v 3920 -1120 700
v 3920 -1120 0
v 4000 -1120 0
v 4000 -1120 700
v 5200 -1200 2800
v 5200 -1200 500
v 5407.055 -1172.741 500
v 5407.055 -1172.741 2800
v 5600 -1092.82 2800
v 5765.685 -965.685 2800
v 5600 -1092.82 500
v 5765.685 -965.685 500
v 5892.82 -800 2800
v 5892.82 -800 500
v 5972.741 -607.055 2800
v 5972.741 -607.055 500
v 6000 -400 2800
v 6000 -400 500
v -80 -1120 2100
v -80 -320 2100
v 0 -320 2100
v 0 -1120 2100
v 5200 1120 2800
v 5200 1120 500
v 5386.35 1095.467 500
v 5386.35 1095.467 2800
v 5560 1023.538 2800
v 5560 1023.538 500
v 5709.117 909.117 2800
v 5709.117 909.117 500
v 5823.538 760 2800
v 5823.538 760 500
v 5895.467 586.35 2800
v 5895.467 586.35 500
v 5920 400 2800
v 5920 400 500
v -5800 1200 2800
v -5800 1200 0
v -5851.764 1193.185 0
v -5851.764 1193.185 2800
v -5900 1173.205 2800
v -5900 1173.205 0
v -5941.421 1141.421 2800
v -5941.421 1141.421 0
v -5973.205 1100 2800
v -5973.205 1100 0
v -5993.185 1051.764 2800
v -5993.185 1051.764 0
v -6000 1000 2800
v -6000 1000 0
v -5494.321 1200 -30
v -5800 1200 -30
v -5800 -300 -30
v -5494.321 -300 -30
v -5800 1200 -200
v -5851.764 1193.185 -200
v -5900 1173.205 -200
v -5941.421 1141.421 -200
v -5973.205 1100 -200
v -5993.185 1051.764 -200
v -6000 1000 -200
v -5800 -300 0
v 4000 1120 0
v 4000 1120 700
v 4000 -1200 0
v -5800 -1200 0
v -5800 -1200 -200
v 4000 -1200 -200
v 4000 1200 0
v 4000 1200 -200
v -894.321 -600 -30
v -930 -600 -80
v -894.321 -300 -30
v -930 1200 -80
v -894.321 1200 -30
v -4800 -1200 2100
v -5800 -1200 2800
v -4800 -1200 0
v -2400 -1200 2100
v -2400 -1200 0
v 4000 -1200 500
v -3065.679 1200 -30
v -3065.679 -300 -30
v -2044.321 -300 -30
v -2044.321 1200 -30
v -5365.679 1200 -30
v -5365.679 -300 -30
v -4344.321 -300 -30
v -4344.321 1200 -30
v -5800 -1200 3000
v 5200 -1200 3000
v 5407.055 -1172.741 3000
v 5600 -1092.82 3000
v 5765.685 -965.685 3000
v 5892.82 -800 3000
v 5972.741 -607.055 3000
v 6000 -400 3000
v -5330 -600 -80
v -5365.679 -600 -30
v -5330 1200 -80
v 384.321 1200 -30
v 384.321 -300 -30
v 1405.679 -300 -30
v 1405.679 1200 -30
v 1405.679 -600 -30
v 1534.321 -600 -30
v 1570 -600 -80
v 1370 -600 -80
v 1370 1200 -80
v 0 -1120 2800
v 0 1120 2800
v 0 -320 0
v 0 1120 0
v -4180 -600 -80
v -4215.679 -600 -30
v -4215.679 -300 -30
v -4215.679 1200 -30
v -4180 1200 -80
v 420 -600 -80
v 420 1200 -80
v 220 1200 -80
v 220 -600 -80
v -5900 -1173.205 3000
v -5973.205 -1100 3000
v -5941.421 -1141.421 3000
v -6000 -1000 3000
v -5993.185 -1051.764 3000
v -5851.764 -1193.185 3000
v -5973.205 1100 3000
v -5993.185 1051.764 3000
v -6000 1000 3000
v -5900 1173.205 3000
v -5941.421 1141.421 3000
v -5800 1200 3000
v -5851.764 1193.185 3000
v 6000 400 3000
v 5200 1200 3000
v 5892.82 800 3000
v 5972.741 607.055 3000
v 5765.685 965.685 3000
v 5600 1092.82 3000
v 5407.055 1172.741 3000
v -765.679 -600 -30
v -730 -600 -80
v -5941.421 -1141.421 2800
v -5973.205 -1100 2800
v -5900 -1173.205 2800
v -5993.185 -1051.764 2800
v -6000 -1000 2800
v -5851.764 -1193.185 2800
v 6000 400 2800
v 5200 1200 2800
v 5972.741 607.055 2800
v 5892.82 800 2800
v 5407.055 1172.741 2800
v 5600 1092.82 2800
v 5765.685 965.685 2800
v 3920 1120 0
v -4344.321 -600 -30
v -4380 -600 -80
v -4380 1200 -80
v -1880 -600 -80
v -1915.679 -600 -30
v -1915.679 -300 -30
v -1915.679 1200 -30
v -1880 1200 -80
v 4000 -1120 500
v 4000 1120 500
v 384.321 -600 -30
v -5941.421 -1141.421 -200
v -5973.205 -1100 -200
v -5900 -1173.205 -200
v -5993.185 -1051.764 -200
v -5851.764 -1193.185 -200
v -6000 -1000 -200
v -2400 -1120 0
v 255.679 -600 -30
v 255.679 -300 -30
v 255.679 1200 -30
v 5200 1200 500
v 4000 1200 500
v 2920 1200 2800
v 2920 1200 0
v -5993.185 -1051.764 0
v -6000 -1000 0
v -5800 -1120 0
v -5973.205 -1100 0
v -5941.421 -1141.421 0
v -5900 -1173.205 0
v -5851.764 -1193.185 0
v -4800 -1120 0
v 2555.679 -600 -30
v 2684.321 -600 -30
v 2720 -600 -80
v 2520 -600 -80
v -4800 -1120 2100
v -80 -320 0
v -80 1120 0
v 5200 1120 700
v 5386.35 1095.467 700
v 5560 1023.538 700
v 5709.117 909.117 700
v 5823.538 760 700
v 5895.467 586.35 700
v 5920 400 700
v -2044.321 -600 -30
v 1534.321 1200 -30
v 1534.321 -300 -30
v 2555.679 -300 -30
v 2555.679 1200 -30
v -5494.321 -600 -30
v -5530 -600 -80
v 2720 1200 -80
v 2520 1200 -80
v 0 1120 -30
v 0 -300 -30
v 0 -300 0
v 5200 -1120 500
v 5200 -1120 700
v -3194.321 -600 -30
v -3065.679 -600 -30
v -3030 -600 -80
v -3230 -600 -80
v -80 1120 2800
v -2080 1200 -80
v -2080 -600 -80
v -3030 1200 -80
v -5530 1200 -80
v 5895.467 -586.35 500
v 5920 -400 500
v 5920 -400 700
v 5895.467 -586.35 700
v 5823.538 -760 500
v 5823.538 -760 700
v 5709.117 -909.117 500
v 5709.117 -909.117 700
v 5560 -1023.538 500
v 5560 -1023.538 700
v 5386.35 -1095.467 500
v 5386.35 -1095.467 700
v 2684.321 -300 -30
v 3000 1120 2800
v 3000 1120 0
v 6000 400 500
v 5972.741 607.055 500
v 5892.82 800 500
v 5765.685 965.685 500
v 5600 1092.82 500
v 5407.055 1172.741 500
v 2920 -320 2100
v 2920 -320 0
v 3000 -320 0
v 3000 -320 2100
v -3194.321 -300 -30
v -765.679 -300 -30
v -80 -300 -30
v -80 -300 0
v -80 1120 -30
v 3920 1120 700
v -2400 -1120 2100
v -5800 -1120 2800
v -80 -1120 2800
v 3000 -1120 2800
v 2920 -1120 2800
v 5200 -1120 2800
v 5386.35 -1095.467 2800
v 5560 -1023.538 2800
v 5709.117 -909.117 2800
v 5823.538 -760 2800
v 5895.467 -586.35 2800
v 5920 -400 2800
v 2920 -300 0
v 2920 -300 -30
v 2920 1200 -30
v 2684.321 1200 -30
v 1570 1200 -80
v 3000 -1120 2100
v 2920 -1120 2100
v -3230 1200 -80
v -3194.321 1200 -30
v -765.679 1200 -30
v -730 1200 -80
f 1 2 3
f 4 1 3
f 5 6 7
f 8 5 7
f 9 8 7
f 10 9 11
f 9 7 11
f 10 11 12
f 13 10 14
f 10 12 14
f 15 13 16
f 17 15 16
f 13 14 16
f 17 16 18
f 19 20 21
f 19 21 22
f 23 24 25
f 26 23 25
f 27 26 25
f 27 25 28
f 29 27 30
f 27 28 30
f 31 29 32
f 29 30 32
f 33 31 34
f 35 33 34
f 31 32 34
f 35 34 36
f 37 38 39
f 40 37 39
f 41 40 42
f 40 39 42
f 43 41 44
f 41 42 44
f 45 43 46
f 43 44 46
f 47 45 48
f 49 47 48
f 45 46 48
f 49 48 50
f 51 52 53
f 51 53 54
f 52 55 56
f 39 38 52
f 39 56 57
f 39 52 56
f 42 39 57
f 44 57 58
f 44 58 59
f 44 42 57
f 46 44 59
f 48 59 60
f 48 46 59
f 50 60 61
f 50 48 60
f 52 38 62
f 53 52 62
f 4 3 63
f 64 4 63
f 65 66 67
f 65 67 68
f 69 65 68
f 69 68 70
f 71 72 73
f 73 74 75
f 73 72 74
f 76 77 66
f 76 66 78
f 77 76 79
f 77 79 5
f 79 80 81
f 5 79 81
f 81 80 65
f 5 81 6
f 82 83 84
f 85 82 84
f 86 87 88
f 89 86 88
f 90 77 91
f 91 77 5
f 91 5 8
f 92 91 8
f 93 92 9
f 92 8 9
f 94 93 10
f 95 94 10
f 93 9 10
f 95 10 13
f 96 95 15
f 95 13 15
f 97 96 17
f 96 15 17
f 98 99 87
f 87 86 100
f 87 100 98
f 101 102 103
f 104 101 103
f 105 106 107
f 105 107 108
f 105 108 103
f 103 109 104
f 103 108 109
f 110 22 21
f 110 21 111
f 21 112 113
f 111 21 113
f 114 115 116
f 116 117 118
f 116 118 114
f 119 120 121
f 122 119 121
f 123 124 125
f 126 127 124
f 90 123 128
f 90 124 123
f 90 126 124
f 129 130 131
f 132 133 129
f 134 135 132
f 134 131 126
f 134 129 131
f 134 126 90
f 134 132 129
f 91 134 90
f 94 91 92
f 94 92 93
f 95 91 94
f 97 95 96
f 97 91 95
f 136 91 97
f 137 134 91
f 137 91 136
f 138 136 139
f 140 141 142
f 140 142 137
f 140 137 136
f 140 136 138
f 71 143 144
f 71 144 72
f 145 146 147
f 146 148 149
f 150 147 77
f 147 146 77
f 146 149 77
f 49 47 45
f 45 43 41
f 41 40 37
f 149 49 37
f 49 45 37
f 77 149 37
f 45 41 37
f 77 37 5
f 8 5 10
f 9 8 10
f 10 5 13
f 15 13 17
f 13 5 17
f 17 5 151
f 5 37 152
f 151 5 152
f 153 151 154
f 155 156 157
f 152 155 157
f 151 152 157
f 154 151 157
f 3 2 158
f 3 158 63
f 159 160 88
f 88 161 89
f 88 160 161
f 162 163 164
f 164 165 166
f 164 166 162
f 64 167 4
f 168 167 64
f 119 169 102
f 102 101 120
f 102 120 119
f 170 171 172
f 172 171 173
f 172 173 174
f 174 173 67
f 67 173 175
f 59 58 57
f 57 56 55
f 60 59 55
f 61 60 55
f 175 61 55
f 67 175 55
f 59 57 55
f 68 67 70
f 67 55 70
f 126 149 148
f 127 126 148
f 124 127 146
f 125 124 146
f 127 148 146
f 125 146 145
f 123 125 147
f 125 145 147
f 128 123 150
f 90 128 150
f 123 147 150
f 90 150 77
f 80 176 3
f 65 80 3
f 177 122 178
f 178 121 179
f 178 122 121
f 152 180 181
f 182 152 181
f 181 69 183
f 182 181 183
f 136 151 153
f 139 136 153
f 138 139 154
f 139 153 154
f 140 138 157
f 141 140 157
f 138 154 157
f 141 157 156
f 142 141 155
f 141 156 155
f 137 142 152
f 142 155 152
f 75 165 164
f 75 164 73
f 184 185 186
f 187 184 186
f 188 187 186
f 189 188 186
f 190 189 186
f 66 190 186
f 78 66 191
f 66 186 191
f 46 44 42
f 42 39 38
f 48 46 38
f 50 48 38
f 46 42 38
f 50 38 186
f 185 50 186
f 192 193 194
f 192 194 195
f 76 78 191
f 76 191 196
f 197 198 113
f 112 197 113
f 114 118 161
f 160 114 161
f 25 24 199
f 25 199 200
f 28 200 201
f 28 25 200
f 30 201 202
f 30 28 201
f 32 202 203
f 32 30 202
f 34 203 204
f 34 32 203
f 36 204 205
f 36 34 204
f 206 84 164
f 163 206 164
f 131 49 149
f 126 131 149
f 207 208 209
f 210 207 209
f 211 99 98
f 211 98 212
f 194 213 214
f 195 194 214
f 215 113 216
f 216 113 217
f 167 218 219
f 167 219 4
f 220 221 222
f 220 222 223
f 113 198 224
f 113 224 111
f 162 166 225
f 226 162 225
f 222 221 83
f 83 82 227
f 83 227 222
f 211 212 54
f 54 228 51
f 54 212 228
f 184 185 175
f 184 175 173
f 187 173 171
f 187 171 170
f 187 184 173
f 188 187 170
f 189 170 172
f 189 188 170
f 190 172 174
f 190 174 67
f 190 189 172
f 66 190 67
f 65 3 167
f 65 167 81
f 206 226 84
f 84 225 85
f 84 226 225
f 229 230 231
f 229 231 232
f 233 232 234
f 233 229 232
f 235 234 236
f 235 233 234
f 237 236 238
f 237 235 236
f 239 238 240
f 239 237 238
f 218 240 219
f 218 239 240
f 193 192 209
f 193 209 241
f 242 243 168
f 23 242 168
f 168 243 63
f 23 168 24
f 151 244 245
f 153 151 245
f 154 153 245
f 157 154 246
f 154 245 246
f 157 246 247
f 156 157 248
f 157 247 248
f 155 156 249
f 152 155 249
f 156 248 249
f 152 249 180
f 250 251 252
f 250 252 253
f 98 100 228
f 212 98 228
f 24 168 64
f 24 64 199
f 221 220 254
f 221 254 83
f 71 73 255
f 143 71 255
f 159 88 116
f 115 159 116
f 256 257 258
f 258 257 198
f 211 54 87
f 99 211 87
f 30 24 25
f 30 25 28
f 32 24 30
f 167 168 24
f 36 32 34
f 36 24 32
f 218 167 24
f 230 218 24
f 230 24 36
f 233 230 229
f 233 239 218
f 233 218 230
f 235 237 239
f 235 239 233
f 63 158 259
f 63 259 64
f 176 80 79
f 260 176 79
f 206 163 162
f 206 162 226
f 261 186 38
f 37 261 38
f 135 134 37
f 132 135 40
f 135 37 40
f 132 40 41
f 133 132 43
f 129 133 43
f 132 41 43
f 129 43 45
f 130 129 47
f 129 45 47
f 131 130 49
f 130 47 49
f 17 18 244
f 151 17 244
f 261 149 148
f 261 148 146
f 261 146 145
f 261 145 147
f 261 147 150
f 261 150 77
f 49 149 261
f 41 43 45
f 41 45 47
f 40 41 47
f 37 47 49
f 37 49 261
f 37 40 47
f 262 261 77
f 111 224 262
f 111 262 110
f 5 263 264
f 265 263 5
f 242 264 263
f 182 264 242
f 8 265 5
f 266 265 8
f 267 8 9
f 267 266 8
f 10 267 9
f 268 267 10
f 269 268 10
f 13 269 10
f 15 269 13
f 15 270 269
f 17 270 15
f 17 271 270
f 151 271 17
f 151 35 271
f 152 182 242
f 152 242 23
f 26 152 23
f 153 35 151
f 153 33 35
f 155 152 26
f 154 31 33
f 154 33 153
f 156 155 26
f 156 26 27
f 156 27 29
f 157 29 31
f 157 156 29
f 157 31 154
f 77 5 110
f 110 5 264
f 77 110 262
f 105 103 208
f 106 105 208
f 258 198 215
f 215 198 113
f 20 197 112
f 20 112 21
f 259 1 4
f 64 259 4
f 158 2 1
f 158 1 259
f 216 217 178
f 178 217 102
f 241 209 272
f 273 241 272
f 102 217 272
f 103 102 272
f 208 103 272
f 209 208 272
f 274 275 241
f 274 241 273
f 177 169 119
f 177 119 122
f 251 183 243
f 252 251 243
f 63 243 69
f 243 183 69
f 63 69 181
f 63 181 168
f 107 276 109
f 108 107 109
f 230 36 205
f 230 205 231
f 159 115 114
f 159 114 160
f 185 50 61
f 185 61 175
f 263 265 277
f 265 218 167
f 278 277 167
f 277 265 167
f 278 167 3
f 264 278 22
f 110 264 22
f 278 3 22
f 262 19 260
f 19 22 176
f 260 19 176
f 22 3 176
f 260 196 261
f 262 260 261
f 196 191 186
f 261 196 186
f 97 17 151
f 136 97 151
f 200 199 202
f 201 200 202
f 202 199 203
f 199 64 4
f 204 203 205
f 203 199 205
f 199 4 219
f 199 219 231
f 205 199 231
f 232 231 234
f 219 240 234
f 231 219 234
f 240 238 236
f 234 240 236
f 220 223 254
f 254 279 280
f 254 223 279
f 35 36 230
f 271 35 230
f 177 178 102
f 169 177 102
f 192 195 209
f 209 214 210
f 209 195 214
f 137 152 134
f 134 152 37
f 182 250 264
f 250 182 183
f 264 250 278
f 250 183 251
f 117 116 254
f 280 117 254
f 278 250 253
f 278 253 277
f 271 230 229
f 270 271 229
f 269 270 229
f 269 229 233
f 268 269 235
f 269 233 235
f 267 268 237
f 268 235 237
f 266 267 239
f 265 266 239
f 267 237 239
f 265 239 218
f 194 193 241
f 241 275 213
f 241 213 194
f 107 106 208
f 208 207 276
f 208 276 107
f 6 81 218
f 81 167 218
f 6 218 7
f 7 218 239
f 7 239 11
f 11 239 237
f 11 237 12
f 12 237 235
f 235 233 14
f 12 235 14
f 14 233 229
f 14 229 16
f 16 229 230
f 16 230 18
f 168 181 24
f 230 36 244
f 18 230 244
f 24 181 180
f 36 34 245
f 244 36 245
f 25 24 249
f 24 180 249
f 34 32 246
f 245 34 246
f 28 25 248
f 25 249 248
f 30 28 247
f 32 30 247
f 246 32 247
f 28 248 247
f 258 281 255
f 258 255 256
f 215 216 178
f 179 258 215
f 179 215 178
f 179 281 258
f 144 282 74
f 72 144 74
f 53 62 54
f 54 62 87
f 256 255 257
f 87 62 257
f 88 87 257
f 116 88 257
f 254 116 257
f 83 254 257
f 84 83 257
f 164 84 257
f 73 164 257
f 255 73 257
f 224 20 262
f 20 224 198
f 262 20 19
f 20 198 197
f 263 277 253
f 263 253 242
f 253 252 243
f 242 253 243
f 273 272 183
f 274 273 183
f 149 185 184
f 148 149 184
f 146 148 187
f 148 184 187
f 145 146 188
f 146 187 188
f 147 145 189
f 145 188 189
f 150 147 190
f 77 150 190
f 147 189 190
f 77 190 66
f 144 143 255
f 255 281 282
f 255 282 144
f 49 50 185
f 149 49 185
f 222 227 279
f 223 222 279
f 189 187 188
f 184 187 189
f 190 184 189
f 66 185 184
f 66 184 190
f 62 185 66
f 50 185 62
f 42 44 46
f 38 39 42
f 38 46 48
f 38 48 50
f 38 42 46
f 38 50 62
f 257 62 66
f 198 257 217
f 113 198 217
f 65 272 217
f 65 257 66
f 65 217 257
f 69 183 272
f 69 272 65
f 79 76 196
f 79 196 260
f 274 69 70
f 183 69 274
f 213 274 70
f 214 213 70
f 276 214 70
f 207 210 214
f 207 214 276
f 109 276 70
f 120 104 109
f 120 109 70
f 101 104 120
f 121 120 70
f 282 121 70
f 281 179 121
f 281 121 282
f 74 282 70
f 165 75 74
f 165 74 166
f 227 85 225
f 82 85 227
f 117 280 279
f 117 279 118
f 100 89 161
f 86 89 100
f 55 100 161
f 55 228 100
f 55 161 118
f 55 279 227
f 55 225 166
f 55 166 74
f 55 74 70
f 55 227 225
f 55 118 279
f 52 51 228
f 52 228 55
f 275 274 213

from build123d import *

# Parameters (mm, degrees)
F0_W      = 80
F0_H      = 820
F0_H_2    = 1420
F1_DEPTH  = 2800
F0_W_2    = 920
F0_H_3    = 2240
F0_W_3    = 5720
F0_W_4    = 2920
F2_DEPTH  = 200
F3_W      = 2400
F3_H      = 2100
F4_DEPTH  = 1454.2702436447
F5_W      = 800
F5_H      = 2100
F6_DEPTH  = 3837.007522583
F7_DEPTH  = 30
F9_DEPTH  = 1800
F10_DEPTH = 500
F11_DEPTH = 700
F13_DEPTH = 200
F15_DEPTH = 200


with BuildPart() as f1:
    # F0 (on Top) → F1 (new body)
    with BuildSketch(Plane.XY):
        with BuildLine():
            Line((4000, -1200), (5200, -1200))
            ThreePointArc((5200, -1200), (5765.6854249492, -965.6854249492), (6000, -400))
            Line((6000, -400), (6000, 400))
            ThreePointArc((6000, 400), (5765.6854249492, 965.6854249492), (5200, 1200))
            Line((5200, 1200), (4000, 1200))
            Line((4000, 1200), (4000, 1120))
            Line((4000, 1120), (5200, 1120))
            ThreePointArc((5200, 1120), (5709.1168824543, 909.1168824543), (5920, 400))
            Line((5920, 400), (5920, -400))
            ThreePointArc((5920, -400), (5709.1168824543, -909.1168824543), (5200, -1120))
            Line((5200, -1120), (4000, -1120))
            Line((4000, -1120), (4000, -1200))
        make_face()
        with BuildLine():
            Line((-5800, -1200), (4000, -1200))
            Line((4000, -1200), (4000, -1120))
            Line((4000, -1120), (3920, -1120))
            Line((3920, -1120), (3000, -1120))
            Line((3000, -1120), (2920, -1120))
            Line((2920, -1120), (0, -1120))
            Line((0, -1120), (-80, -1120))
            Line((-80, -1120), (-5800, -1120))
            Line((-5800, -1120), (-5800, -300))
            Line((-5800, -300), (-5800, 1200))
            ThreePointArc((-5800, 1200), (-5941.4213562373, 1141.4213562373), (-6000, 1000))
            Line((-6000, 1000), (-6000, -1000))
            ThreePointArc((-6000, -1000), (-5941.4213562373, -1141.4213562373), (-5800, -1200))
        make_face()
        with Locations((-40, -710)):
            Rectangle(F0_W, F0_H)
        with Locations((-40, 410)):
            Rectangle(F0_W, F0_H_2)
        Polygon((3920, 1120), (4000, 1120), (4000, 1200), (2920, 1200), (2920, -300), (2920, -1120), (3000, -1120), (3000, 1120), align=None)
    extrude(amount=F1_DEPTH)

    # F3 (on face) → F4 (cut)
    with BuildSketch(Plane.XZ.offset(1200)):
        with Locations((-3600, 1050)):
            Rectangle(F3_W, F3_H)
    extrude(amount=-F4_DEPTH, mode=Mode.SUBTRACT)

    # F5 (on face) → F6 (cut)
    with BuildSketch(Plane(origin=(-80, 0, 0), x_dir=(0, -1, 0), z_dir=(-1, 0, 0))):
        with Locations((720, 1050)):
            Rectangle(F5_W, F5_H)
    extrude(amount=-F6_DEPTH, mode=Mode.SUBTRACT)

    # F0 (on Top) → F10 (cut)
    with BuildSketch(Plane.XY):
        with BuildLine():
            Line((4000, -1200), (5200, -1200))
            ThreePointArc((5200, -1200), (5765.6854249492, -965.6854249492), (6000, -400))
            Line((6000, -400), (6000, 400))
            ThreePointArc((6000, 400), (5765.6854249492, 965.6854249492), (5200, 1200))
            Line((5200, 1200), (4000, 1200))
            Line((4000, 1200), (4000, 1120))
            Line((4000, 1120), (5200, 1120))
            ThreePointArc((5200, 1120), (5709.1168824543, 909.1168824543), (5920, 400))
            Line((5920, 400), (5920, -400))
            ThreePointArc((5920, -400), (5709.1168824543, -909.1168824543), (5200, -1120))
            Line((5200, -1120), (4000, -1120))
            Line((4000, -1120), (4000, -1200))
        make_face()
    extrude(amount=F10_DEPTH, mode=Mode.SUBTRACT)


with BuildPart() as f2:
    # F0 (on Top) → F2 (new body)
    with BuildSketch(Plane.XY):
        with Locations((3460, 0)):
            Rectangle(F0_W_2, F0_H_3)
        with Locations((-40, -710)):
            Rectangle(F0_W, F0_H)
        with Locations((-40, 410)):
            Rectangle(F0_W, F0_H_2)
        with Locations((-2940, -710)):
            Rectangle(F0_W_3, F0_H)
        with Locations((1460, -710)):
            Rectangle(F0_W_4, F0_H)
        Polygon((2920, 1200), (-5800, 1200), (-5800, -300), (-80, -300), (-80, 1120), (0, 1120), (0, -300), (2920, -300), align=None)
        with BuildLine():
            Line((-5800, -1200), (4000, -1200))
            Line((4000, -1200), (4000, -1120))
            Line((4000, -1120), (3920, -1120))
            Line((3920, -1120), (3000, -1120))
            Line((3000, -1120), (2920, -1120))
            Line((2920, -1120), (0, -1120))
            Line((0, -1120), (-80, -1120))
            Line((-80, -1120), (-5800, -1120))
            Line((-5800, -1120), (-5800, -300))
            Line((-5800, -300), (-5800, 1200))
            ThreePointArc((-5800, 1200), (-5941.4213562373, 1141.4213562373), (-6000, 1000))
            Line((-6000, 1000), (-6000, -1000))
            ThreePointArc((-6000, -1000), (-5941.4213562373, -1141.4213562373), (-5800, -1200))
        make_face()
        Polygon((3920, 1120), (4000, 1120), (4000, 1200), (2920, 1200), (2920, -300), (2920, -1120), (3000, -1120), (3000, 1120), align=None)
        with Locations((3960, 0)):
            Rectangle(F0_W, F0_H_3)
    extrude(amount=-F2_DEPTH)

    # F0 (on Top) → F7 (cut)
    with BuildSketch(Plane.XY):
        Polygon((2920, 1200), (-5800, 1200), (-5800, -300), (-80, -300), (-80, 1120), (0, 1120), (0, -300), (2920, -300), align=None)
    extrude(amount=-F7_DEPTH, mode=Mode.SUBTRACT)

    # F8 (on face) → F9 (cut)
    with BuildSketch(Plane(origin=(0, 1200, 0), x_dir=(-1, 0, 0), z_dir=(0, 1, 0))):
        Polygon((-2555.679101944, -30), (-2684.320898056, -30), (-2720, -80), (-2520, -80), align=None)
        Polygon((-1405.679101944, -30), (-1534.320898056, -30), (-1570, -80), (-1370, -80), align=None)
        Polygon((-255.679101944, -30), (-384.320898056, -30), (-420, -80), (-220, -80), align=None)
        Polygon((2080, -80), (2044.320898056, -30), (1915.679101944, -30), (1880, -80), align=None)
        Polygon((894.320898056, -30), (765.679101944, -30), (730, -80), (930, -80), align=None)
        Polygon((3230, -80), (3194.320898056, -30), (3065.679101944, -30), (3030, -80), align=None)
        Polygon((4380, -80), (4344.320898056, -30), (4215.679101944, -30), (4180, -80), align=None)
        Polygon((5530, -80), (5494.320898056, -30), (5365.679101944, -30), (5330, -80), align=None)
    extrude(amount=-F9_DEPTH, mode=Mode.SUBTRACT)


with BuildPart() as f11:
    # F0 (on Top) → F11 (new body)
    with BuildSketch(Plane.XY):
        with Locations((3960, 0)):
            Rectangle(F0_W, F0_H_3)
    extrude(amount=F11_DEPTH)


with BuildPart() as f13:
    # F12 (on face) → F13 (new body)
    with BuildSketch(Plane(origin=(0, 0, 500), x_dir=(1, 0, 0), z_dir=(0, 0, -1))):
        with BuildLine():
            Line((4000, 1120), (4000, -1120))
            Line((4000, -1120), (5200, -1120))
            ThreePointArc((5200, -1120), (5709.1168824543, -909.1168824543), (5920, -400))
            Line((5920, -400), (5920, 400))
            ThreePointArc((5920, 400), (5709.1168824543, 909.1168824543), (5200, 1120))
            Line((5200, 1120), (4000, 1120))
        make_face()
    extrude(amount=-F13_DEPTH)


with BuildPart() as f15:
    # F14 (on face) → F15 (new body)
    with BuildSketch(Plane.XY.offset(2800)):
        with BuildLine():
            Line((-5800, -1200), (5200, -1200))
            ThreePointArc((5200, -1200), (5765.6854249492, -965.6854249492), (6000, -400))
            Line((6000, -400), (6000, 400))
            ThreePointArc((6000, 400), (5765.6854249492, 965.6854249492), (5200, 1200))
            Line((5200, 1200), (2920, 1200))
            Line((2920, 1200), (2920, -1120))
            Line((2920, -1120), (0, -1120))
            Line((0, -1120), (0, 1120))
            Line((0, 1120), (-80, 1120))
            Line((-80, 1120), (-80, -1120))
            Line((-80, -1120), (-5800, -1120))
            Line((-5800, -1120), (-5800, 1200))
            ThreePointArc((-5800, 1200), (-5941.4213562373, 1141.4213562373), (-6000, 1000))
            Line((-6000, 1000), (-6000, -1000))
            ThreePointArc((-6000, -1000), (-5941.4213562373, -1141.4213562373), (-5800, -1200))
        make_face()
        with BuildLine():
            Line((5920, 400), (5920, -400))
            ThreePointArc((5920, -400), (5709.1168824543, -909.1168824543), (5200, -1120))
            Line((5200, -1120), (3000, -1120))
            Line((3000, -1120), (3000, 1120))
            Line((3000, 1120), (5200, 1120))
            ThreePointArc((5200, 1120), (5709.1168824543, 909.1168824543), (5920, 400))
        make_face(mode=Mode.SUBTRACT)
        with BuildLine():
            ThreePointArc((5200, -1120), (5709.1168824543, -909.1168824543), (5920, -400))
            Line((5920, -400), (5920, 400))
            ThreePointArc((5920, 400), (5709.1168824543, 909.1168824543), (5200, 1120))
            Line((5200, 1120), (3000, 1120))
            Line((3000, 1120), (3000, -1120))
            Line((3000, -1120), (5200, -1120))
        make_face()
        Polygon((2920, 1200), (-5800, 1200), (-5800, -1120), (-80, -1120), (-80, 1120), (0, 1120), (0, -1120), (2920, -1120), align=None)
    extrude(amount=F15_DEPTH)


solid = Compound([f1.part, f2.part, f11.part, f13.part, f15.part])
